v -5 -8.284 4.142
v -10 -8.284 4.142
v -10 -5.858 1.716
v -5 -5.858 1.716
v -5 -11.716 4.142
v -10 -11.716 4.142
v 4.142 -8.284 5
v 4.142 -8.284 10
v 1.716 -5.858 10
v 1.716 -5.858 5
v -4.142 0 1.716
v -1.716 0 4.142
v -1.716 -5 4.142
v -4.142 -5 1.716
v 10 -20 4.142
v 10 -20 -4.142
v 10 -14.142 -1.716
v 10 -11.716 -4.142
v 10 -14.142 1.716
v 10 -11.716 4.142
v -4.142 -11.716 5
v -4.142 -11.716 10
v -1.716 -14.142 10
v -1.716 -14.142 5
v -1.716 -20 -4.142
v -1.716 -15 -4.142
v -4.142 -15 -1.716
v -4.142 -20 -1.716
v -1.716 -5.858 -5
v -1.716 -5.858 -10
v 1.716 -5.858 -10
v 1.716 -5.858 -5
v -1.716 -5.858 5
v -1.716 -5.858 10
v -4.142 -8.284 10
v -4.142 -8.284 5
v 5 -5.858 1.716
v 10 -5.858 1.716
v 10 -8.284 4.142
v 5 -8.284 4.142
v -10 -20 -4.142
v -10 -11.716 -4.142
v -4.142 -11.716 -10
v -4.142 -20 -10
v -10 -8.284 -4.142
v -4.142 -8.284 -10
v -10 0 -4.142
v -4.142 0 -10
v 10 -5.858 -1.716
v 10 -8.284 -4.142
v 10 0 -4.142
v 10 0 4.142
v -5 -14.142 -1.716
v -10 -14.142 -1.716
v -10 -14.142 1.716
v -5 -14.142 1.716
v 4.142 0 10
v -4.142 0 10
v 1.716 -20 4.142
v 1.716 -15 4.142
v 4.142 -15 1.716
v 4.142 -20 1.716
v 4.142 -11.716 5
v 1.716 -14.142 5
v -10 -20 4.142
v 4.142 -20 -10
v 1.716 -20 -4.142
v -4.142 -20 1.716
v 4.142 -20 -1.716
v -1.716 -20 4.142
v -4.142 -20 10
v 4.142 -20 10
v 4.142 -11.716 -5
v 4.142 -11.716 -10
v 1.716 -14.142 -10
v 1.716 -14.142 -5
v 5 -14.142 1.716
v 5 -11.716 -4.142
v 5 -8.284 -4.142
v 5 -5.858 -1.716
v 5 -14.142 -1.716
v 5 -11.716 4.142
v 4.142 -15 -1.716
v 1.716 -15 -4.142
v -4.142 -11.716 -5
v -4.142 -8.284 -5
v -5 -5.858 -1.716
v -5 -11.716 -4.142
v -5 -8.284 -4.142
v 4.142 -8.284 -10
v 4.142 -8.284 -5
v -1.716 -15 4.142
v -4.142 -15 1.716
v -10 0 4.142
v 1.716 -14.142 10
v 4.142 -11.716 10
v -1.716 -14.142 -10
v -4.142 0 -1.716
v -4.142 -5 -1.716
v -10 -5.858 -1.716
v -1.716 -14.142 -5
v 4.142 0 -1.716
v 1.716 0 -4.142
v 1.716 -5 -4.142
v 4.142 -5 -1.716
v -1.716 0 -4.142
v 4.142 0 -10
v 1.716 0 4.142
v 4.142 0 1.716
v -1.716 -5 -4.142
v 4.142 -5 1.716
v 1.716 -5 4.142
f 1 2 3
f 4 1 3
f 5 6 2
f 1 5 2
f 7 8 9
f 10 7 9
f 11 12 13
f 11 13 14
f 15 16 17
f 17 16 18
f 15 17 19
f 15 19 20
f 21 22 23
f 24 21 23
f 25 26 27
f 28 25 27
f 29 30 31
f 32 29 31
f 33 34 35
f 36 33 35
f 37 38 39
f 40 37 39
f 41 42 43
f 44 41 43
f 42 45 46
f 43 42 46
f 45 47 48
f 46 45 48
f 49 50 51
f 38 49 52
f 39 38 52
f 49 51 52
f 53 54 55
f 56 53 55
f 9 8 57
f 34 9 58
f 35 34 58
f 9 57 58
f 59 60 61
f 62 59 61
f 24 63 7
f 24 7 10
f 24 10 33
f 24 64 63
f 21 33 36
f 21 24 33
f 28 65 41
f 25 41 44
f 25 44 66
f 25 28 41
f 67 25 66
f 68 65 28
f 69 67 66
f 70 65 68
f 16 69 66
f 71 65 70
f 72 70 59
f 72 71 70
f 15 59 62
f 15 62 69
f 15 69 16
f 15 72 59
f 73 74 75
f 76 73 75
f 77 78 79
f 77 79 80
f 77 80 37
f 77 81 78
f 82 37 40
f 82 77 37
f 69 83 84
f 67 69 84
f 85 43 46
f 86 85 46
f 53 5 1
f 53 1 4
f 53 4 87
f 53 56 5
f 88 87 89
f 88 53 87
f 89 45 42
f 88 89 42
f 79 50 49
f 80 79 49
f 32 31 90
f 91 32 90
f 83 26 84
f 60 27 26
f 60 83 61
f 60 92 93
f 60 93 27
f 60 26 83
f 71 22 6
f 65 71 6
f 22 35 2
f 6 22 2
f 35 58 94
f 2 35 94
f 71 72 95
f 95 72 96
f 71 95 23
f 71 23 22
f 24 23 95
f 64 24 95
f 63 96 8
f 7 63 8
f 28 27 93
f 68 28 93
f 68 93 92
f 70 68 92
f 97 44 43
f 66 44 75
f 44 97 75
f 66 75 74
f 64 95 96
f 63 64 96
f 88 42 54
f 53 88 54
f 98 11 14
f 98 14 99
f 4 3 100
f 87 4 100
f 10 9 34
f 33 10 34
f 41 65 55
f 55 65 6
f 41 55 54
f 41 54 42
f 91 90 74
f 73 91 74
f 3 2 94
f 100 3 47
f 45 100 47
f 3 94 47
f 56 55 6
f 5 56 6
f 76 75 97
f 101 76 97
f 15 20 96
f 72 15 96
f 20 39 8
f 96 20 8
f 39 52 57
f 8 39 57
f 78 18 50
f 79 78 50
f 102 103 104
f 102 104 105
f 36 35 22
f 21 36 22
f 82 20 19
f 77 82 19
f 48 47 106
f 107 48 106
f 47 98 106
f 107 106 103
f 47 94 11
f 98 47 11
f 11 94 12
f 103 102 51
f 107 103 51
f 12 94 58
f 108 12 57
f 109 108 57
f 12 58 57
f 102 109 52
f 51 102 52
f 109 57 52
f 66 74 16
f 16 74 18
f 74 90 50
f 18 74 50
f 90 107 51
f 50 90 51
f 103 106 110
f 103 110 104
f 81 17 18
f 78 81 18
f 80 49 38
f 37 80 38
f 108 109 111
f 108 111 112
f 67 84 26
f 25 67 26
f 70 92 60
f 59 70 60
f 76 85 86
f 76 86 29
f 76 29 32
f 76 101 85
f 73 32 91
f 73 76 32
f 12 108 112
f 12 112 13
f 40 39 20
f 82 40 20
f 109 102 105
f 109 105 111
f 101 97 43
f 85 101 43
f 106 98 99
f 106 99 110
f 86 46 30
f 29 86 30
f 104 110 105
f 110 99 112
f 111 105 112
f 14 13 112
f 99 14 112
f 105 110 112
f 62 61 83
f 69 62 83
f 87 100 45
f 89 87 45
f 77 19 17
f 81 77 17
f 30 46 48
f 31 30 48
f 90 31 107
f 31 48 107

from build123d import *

# Parameters (mm, degrees)
F1_DEPTH        = 15
F2_DEPTH        = 20
F3_DEPTH        = 5
F5_DEPTH        = 5
F5_COPIES_COUNT = 4


# Not quite as in the source:
# - a pattern or mirror of a feature is missing from the dataset's text; its kind, count and spacing are read off the source's solid


with BuildPart() as f1:
    # F0 (on Front) → F1 (new body)
    with BuildSketch(Plane.XZ):
        Polygon((-4.1421356237, -1.7157287525), (-1.7157287525, -4.1421356237), (1.7157287525, -4.1421356237), (4.1421356237, -1.7157287525), (4.1421356237, 1.7157287525), (1.7157287525, 4.1421356237), (-1.7157287525, 4.1421356237), (-4.1421356237, 1.7157287525), align=None)
    extrude(amount=F1_DEPTH)

    # F0 (on Front) → F2 (join)
    with BuildSketch(Plane.XZ):
        Polygon((4.1421356237, -10), (10, -4.1421356237), (10, 4.1421356237), (4.1421356237, 10), (-4.1421356237, 10), (-10, 4.1421356237), (-10, -4.1421356237), (-4.1421356237, -10), align=None)
        Polygon((1.7157287525, -4.1421356237), (-1.7157287525, -4.1421356237), (-4.1421356237, -1.7157287525), (-4.1421356237, 1.7157287525), (-1.7157287525, 4.1421356237), (1.7157287525, 4.1421356237), (4.1421356237, 1.7157287525), (4.1421356237, -1.7157287525), align=None, mode=Mode.SUBTRACT)
    extrude(amount=F2_DEPTH)

    # F0 (on Front) → F3 (cut)
    with BuildSketch(Plane.XZ):
        Polygon((-4.1421356237, -1.7157287525), (-1.7157287525, -4.1421356237), (1.7157287525, -4.1421356237), (4.1421356237, -1.7157287525), (4.1421356237, 1.7157287525), (1.7157287525, 4.1421356237), (-1.7157287525, 4.1421356237), (-4.1421356237, 1.7157287525), align=None)
    extrude(amount=F3_DEPTH, mode=Mode.SUBTRACT)

    # F4 (on face) → F5 (cut)
    with BuildSketch(Plane(origin=(0, 0, -10), x_dir=(1, 0, 0), z_dir=(0, 0, -1))):
        Polygon((-4.1421356237, 11.7157287525), (-4.1421356237, 8.2842712475), (-1.7157287525, 5.8578643763), (1.7157287525, 5.8578643763), (4.1421356237, 8.2842712475), (4.1421356237, 11.7157287525), (1.7157287525, 14.1421356237), (-1.7157287525, 14.1421356237), align=None)
    f5 = extrude(amount=-F5_DEPTH, mode=Mode.SUBTRACT)

    # F5_copies: F5 ×4 about axis
    f5_copies_axis = Axis((0, 0, 0), (0, 1, 0))
    for i in range(1, F5_COPIES_COUNT):
        add(f5.rotate(f5_copies_axis, i * 360 / F5_COPIES_COUNT), mode=Mode.SUBTRACT)


solid = f1.part
